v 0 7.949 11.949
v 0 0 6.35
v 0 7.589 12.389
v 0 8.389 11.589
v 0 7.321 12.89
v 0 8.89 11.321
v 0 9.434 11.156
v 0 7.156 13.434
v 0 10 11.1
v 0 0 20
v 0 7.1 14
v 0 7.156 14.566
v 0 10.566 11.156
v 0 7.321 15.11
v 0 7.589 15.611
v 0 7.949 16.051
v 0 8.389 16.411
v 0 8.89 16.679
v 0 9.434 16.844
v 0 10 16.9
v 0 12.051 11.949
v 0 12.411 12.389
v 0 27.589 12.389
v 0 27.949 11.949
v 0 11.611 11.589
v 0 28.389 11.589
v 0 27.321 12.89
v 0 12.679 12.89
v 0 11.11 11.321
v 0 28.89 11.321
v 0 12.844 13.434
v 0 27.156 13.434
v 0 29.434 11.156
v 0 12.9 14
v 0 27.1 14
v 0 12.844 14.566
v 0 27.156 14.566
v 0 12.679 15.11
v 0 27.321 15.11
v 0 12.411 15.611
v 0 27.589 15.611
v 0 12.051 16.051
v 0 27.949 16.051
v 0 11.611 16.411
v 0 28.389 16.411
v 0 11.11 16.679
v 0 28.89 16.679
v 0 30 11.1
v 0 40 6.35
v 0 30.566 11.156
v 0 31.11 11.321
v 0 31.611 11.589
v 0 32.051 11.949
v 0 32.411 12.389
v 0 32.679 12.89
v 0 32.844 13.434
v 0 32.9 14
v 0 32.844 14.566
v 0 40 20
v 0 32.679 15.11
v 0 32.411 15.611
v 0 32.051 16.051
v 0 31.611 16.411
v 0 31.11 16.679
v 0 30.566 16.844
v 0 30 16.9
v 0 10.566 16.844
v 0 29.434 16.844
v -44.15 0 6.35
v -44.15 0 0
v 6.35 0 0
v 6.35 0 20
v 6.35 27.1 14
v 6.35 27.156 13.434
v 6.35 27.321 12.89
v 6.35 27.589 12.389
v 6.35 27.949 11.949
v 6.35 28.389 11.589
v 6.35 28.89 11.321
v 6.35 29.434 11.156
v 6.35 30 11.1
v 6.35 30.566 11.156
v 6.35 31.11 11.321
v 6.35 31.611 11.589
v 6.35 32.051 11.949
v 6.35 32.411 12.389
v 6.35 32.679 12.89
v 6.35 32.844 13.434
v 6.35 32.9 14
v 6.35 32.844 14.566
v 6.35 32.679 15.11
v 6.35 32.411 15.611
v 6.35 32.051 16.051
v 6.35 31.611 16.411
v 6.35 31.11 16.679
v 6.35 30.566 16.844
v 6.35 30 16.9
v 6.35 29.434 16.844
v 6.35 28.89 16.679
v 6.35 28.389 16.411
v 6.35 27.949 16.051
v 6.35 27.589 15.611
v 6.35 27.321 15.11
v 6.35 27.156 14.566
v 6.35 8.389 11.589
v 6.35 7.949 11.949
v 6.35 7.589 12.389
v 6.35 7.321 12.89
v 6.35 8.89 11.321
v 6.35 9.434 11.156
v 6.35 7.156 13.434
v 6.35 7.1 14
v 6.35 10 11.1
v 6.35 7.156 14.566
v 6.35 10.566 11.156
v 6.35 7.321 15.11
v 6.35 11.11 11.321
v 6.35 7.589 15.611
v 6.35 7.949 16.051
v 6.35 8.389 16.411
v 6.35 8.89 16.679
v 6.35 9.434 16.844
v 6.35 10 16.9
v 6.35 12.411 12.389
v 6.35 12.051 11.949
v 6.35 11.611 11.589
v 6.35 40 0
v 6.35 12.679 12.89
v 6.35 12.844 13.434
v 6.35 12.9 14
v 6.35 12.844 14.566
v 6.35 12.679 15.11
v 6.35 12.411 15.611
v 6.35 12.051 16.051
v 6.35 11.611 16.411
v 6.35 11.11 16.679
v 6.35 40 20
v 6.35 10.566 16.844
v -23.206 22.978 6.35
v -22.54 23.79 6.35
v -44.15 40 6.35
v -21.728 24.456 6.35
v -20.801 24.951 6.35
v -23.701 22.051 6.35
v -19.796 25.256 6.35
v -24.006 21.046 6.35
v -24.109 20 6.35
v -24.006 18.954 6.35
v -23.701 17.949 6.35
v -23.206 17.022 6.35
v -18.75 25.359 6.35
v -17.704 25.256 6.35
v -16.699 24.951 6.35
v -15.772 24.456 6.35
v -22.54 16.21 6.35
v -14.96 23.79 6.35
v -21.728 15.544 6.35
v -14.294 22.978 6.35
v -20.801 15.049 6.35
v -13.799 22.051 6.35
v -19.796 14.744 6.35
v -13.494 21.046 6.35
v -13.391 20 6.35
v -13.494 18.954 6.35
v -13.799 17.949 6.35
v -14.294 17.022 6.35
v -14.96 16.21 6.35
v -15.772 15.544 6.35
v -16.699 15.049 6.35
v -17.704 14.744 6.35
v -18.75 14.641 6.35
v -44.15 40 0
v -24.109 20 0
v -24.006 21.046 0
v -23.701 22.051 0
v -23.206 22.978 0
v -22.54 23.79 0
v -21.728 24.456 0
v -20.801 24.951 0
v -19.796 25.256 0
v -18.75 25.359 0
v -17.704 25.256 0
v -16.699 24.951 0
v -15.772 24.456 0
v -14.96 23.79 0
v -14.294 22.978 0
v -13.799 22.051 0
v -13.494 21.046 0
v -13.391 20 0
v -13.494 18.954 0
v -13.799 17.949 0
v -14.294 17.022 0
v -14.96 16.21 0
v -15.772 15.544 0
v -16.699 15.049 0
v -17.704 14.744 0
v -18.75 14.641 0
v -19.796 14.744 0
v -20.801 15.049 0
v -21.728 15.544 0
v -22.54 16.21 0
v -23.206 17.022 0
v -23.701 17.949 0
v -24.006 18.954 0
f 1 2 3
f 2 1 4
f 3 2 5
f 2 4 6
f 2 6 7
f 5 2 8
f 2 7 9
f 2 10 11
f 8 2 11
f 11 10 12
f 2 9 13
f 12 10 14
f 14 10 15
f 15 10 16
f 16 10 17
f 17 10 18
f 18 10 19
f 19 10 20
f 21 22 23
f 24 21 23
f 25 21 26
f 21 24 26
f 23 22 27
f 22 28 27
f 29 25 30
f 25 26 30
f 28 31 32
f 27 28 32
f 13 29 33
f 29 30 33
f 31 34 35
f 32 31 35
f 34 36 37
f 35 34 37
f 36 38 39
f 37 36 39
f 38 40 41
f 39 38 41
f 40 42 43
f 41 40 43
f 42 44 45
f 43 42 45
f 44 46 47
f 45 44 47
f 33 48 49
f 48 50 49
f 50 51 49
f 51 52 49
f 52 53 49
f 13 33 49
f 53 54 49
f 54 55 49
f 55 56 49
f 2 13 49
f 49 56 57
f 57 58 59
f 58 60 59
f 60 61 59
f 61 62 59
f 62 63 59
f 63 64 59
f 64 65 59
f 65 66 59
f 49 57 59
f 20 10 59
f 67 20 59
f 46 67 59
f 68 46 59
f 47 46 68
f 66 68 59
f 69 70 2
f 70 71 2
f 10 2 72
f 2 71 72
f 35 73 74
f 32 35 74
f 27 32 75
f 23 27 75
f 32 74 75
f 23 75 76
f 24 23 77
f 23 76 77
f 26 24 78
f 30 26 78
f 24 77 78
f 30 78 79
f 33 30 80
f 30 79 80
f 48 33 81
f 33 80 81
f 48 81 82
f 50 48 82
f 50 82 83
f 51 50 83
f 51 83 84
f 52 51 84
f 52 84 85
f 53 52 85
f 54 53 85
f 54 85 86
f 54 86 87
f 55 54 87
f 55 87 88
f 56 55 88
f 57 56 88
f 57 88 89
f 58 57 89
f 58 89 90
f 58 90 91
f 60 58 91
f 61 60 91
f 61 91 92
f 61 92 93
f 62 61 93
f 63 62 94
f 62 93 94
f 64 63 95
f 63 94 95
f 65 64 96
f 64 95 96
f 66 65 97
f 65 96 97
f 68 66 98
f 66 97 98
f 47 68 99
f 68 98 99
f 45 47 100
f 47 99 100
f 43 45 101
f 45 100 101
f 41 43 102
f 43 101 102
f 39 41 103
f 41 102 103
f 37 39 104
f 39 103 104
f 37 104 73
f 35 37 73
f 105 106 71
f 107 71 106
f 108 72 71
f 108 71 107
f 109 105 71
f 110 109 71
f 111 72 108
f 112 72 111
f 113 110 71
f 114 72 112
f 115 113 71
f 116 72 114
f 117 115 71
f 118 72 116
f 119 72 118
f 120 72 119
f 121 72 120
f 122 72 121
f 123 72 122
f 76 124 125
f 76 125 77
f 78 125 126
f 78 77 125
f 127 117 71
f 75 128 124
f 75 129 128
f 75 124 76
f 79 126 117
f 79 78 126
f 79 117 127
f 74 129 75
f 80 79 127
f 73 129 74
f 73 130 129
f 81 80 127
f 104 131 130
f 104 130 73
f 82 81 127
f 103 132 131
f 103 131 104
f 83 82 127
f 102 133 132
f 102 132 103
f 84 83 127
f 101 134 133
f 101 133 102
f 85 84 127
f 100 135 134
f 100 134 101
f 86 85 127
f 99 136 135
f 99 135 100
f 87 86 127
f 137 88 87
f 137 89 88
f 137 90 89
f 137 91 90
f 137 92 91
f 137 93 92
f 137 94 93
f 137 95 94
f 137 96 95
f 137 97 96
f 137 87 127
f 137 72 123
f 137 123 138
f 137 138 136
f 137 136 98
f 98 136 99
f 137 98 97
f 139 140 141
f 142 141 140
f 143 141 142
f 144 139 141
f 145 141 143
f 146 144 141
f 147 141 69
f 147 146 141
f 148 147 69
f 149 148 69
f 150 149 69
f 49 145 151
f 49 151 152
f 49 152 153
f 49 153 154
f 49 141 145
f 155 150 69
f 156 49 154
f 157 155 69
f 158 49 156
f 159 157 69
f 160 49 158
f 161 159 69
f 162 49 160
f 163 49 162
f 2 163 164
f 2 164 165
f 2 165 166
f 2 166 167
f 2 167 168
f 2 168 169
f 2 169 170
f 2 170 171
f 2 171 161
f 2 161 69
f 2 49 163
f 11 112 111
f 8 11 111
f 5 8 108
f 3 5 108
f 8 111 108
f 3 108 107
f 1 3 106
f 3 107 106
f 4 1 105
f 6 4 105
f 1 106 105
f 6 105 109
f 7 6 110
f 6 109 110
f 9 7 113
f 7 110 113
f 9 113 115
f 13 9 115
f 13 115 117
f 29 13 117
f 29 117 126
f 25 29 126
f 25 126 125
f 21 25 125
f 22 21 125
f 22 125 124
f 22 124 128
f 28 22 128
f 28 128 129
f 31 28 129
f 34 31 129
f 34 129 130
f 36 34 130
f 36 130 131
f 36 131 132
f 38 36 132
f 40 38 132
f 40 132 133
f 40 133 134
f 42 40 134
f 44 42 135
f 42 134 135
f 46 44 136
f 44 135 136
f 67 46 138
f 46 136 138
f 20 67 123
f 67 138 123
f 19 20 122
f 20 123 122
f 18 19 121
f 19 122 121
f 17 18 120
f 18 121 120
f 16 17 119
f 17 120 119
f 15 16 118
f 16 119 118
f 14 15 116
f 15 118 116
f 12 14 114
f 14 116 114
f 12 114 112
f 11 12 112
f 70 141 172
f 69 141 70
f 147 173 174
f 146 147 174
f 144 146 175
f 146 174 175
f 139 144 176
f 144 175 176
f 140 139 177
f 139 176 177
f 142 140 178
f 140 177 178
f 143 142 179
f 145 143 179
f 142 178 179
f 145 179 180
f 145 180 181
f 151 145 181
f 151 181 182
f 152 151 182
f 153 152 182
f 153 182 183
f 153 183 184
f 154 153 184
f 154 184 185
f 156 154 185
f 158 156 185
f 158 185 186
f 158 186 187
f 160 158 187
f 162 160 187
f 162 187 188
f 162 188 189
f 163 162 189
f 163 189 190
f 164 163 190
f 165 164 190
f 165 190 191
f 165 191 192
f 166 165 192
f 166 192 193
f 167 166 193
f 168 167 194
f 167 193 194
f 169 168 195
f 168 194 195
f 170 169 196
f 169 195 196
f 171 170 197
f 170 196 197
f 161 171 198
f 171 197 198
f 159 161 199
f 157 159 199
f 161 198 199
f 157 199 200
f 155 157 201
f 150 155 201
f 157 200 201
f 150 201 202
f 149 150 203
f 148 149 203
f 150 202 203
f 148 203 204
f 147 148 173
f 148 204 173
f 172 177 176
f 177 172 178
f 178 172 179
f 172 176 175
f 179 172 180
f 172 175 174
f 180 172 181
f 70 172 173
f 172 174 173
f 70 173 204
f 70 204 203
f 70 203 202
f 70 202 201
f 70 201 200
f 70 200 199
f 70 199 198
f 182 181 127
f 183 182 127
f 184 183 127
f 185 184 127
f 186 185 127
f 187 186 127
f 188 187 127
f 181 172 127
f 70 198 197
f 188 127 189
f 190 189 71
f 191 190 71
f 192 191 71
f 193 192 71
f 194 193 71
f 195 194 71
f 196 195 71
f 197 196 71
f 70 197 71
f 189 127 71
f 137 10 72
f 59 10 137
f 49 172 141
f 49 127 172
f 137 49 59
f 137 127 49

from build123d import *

# Parameters (mm, degrees)
F0_W     = 40
F0_H     = 20
F1_DEPTH = 6.35
F2_W     = 40
F2_H     = 6.35
F3_DEPTH = 44.15
F5_D     = 10.7188
F5_DEPTH = 12.7
F5_TIP   = 3.2202524016
F6_D     = 5.8
F6_DEPTH = 12.7
F6_TIP   = 1.7424957952


with BuildPart() as f1:
    # F0 (on Right) → F1 (new body)
    with BuildSketch(Plane.YZ):
        with Locations((20, 10)):
            Rectangle(F0_W, F0_H)
    extrude(amount=F1_DEPTH)

    # F2 (on face) → F3 (join)
    with BuildSketch(Plane(origin=(0, 0, 0), x_dir=(0, -1, 0), z_dir=(-1, 0, 0))):
        with Locations((-20, 3.175)):
            Rectangle(F2_W, F2_H)
    extrude(amount=F3_DEPTH)

    # F5
    with Locations(Plane.XY.offset(6.35)):
        with Locations((-18.75, 20)):
            Hole(F5_D / 2, depth=F5_DEPTH)
            with Locations((0, 0, -(F5_DEPTH + F5_TIP / 2))):  # 118° drill point
                Cone(0, F5_D / 2, F5_TIP, mode=Mode.SUBTRACT)

    # F6
    with Locations(Plane(origin=(0, 0, 0), x_dir=(0, 1, 0), z_dir=(-1, 0, 0))):
        with Locations((30, -14), (10, -14)):
            Hole(F6_D / 2, depth=F6_DEPTH)
            with Locations((0, 0, -(F6_DEPTH + F6_TIP / 2))):  # 118° drill point
                Cone(0, F6_D / 2, F6_TIP, mode=Mode.SUBTRACT)


solid = f1.part
